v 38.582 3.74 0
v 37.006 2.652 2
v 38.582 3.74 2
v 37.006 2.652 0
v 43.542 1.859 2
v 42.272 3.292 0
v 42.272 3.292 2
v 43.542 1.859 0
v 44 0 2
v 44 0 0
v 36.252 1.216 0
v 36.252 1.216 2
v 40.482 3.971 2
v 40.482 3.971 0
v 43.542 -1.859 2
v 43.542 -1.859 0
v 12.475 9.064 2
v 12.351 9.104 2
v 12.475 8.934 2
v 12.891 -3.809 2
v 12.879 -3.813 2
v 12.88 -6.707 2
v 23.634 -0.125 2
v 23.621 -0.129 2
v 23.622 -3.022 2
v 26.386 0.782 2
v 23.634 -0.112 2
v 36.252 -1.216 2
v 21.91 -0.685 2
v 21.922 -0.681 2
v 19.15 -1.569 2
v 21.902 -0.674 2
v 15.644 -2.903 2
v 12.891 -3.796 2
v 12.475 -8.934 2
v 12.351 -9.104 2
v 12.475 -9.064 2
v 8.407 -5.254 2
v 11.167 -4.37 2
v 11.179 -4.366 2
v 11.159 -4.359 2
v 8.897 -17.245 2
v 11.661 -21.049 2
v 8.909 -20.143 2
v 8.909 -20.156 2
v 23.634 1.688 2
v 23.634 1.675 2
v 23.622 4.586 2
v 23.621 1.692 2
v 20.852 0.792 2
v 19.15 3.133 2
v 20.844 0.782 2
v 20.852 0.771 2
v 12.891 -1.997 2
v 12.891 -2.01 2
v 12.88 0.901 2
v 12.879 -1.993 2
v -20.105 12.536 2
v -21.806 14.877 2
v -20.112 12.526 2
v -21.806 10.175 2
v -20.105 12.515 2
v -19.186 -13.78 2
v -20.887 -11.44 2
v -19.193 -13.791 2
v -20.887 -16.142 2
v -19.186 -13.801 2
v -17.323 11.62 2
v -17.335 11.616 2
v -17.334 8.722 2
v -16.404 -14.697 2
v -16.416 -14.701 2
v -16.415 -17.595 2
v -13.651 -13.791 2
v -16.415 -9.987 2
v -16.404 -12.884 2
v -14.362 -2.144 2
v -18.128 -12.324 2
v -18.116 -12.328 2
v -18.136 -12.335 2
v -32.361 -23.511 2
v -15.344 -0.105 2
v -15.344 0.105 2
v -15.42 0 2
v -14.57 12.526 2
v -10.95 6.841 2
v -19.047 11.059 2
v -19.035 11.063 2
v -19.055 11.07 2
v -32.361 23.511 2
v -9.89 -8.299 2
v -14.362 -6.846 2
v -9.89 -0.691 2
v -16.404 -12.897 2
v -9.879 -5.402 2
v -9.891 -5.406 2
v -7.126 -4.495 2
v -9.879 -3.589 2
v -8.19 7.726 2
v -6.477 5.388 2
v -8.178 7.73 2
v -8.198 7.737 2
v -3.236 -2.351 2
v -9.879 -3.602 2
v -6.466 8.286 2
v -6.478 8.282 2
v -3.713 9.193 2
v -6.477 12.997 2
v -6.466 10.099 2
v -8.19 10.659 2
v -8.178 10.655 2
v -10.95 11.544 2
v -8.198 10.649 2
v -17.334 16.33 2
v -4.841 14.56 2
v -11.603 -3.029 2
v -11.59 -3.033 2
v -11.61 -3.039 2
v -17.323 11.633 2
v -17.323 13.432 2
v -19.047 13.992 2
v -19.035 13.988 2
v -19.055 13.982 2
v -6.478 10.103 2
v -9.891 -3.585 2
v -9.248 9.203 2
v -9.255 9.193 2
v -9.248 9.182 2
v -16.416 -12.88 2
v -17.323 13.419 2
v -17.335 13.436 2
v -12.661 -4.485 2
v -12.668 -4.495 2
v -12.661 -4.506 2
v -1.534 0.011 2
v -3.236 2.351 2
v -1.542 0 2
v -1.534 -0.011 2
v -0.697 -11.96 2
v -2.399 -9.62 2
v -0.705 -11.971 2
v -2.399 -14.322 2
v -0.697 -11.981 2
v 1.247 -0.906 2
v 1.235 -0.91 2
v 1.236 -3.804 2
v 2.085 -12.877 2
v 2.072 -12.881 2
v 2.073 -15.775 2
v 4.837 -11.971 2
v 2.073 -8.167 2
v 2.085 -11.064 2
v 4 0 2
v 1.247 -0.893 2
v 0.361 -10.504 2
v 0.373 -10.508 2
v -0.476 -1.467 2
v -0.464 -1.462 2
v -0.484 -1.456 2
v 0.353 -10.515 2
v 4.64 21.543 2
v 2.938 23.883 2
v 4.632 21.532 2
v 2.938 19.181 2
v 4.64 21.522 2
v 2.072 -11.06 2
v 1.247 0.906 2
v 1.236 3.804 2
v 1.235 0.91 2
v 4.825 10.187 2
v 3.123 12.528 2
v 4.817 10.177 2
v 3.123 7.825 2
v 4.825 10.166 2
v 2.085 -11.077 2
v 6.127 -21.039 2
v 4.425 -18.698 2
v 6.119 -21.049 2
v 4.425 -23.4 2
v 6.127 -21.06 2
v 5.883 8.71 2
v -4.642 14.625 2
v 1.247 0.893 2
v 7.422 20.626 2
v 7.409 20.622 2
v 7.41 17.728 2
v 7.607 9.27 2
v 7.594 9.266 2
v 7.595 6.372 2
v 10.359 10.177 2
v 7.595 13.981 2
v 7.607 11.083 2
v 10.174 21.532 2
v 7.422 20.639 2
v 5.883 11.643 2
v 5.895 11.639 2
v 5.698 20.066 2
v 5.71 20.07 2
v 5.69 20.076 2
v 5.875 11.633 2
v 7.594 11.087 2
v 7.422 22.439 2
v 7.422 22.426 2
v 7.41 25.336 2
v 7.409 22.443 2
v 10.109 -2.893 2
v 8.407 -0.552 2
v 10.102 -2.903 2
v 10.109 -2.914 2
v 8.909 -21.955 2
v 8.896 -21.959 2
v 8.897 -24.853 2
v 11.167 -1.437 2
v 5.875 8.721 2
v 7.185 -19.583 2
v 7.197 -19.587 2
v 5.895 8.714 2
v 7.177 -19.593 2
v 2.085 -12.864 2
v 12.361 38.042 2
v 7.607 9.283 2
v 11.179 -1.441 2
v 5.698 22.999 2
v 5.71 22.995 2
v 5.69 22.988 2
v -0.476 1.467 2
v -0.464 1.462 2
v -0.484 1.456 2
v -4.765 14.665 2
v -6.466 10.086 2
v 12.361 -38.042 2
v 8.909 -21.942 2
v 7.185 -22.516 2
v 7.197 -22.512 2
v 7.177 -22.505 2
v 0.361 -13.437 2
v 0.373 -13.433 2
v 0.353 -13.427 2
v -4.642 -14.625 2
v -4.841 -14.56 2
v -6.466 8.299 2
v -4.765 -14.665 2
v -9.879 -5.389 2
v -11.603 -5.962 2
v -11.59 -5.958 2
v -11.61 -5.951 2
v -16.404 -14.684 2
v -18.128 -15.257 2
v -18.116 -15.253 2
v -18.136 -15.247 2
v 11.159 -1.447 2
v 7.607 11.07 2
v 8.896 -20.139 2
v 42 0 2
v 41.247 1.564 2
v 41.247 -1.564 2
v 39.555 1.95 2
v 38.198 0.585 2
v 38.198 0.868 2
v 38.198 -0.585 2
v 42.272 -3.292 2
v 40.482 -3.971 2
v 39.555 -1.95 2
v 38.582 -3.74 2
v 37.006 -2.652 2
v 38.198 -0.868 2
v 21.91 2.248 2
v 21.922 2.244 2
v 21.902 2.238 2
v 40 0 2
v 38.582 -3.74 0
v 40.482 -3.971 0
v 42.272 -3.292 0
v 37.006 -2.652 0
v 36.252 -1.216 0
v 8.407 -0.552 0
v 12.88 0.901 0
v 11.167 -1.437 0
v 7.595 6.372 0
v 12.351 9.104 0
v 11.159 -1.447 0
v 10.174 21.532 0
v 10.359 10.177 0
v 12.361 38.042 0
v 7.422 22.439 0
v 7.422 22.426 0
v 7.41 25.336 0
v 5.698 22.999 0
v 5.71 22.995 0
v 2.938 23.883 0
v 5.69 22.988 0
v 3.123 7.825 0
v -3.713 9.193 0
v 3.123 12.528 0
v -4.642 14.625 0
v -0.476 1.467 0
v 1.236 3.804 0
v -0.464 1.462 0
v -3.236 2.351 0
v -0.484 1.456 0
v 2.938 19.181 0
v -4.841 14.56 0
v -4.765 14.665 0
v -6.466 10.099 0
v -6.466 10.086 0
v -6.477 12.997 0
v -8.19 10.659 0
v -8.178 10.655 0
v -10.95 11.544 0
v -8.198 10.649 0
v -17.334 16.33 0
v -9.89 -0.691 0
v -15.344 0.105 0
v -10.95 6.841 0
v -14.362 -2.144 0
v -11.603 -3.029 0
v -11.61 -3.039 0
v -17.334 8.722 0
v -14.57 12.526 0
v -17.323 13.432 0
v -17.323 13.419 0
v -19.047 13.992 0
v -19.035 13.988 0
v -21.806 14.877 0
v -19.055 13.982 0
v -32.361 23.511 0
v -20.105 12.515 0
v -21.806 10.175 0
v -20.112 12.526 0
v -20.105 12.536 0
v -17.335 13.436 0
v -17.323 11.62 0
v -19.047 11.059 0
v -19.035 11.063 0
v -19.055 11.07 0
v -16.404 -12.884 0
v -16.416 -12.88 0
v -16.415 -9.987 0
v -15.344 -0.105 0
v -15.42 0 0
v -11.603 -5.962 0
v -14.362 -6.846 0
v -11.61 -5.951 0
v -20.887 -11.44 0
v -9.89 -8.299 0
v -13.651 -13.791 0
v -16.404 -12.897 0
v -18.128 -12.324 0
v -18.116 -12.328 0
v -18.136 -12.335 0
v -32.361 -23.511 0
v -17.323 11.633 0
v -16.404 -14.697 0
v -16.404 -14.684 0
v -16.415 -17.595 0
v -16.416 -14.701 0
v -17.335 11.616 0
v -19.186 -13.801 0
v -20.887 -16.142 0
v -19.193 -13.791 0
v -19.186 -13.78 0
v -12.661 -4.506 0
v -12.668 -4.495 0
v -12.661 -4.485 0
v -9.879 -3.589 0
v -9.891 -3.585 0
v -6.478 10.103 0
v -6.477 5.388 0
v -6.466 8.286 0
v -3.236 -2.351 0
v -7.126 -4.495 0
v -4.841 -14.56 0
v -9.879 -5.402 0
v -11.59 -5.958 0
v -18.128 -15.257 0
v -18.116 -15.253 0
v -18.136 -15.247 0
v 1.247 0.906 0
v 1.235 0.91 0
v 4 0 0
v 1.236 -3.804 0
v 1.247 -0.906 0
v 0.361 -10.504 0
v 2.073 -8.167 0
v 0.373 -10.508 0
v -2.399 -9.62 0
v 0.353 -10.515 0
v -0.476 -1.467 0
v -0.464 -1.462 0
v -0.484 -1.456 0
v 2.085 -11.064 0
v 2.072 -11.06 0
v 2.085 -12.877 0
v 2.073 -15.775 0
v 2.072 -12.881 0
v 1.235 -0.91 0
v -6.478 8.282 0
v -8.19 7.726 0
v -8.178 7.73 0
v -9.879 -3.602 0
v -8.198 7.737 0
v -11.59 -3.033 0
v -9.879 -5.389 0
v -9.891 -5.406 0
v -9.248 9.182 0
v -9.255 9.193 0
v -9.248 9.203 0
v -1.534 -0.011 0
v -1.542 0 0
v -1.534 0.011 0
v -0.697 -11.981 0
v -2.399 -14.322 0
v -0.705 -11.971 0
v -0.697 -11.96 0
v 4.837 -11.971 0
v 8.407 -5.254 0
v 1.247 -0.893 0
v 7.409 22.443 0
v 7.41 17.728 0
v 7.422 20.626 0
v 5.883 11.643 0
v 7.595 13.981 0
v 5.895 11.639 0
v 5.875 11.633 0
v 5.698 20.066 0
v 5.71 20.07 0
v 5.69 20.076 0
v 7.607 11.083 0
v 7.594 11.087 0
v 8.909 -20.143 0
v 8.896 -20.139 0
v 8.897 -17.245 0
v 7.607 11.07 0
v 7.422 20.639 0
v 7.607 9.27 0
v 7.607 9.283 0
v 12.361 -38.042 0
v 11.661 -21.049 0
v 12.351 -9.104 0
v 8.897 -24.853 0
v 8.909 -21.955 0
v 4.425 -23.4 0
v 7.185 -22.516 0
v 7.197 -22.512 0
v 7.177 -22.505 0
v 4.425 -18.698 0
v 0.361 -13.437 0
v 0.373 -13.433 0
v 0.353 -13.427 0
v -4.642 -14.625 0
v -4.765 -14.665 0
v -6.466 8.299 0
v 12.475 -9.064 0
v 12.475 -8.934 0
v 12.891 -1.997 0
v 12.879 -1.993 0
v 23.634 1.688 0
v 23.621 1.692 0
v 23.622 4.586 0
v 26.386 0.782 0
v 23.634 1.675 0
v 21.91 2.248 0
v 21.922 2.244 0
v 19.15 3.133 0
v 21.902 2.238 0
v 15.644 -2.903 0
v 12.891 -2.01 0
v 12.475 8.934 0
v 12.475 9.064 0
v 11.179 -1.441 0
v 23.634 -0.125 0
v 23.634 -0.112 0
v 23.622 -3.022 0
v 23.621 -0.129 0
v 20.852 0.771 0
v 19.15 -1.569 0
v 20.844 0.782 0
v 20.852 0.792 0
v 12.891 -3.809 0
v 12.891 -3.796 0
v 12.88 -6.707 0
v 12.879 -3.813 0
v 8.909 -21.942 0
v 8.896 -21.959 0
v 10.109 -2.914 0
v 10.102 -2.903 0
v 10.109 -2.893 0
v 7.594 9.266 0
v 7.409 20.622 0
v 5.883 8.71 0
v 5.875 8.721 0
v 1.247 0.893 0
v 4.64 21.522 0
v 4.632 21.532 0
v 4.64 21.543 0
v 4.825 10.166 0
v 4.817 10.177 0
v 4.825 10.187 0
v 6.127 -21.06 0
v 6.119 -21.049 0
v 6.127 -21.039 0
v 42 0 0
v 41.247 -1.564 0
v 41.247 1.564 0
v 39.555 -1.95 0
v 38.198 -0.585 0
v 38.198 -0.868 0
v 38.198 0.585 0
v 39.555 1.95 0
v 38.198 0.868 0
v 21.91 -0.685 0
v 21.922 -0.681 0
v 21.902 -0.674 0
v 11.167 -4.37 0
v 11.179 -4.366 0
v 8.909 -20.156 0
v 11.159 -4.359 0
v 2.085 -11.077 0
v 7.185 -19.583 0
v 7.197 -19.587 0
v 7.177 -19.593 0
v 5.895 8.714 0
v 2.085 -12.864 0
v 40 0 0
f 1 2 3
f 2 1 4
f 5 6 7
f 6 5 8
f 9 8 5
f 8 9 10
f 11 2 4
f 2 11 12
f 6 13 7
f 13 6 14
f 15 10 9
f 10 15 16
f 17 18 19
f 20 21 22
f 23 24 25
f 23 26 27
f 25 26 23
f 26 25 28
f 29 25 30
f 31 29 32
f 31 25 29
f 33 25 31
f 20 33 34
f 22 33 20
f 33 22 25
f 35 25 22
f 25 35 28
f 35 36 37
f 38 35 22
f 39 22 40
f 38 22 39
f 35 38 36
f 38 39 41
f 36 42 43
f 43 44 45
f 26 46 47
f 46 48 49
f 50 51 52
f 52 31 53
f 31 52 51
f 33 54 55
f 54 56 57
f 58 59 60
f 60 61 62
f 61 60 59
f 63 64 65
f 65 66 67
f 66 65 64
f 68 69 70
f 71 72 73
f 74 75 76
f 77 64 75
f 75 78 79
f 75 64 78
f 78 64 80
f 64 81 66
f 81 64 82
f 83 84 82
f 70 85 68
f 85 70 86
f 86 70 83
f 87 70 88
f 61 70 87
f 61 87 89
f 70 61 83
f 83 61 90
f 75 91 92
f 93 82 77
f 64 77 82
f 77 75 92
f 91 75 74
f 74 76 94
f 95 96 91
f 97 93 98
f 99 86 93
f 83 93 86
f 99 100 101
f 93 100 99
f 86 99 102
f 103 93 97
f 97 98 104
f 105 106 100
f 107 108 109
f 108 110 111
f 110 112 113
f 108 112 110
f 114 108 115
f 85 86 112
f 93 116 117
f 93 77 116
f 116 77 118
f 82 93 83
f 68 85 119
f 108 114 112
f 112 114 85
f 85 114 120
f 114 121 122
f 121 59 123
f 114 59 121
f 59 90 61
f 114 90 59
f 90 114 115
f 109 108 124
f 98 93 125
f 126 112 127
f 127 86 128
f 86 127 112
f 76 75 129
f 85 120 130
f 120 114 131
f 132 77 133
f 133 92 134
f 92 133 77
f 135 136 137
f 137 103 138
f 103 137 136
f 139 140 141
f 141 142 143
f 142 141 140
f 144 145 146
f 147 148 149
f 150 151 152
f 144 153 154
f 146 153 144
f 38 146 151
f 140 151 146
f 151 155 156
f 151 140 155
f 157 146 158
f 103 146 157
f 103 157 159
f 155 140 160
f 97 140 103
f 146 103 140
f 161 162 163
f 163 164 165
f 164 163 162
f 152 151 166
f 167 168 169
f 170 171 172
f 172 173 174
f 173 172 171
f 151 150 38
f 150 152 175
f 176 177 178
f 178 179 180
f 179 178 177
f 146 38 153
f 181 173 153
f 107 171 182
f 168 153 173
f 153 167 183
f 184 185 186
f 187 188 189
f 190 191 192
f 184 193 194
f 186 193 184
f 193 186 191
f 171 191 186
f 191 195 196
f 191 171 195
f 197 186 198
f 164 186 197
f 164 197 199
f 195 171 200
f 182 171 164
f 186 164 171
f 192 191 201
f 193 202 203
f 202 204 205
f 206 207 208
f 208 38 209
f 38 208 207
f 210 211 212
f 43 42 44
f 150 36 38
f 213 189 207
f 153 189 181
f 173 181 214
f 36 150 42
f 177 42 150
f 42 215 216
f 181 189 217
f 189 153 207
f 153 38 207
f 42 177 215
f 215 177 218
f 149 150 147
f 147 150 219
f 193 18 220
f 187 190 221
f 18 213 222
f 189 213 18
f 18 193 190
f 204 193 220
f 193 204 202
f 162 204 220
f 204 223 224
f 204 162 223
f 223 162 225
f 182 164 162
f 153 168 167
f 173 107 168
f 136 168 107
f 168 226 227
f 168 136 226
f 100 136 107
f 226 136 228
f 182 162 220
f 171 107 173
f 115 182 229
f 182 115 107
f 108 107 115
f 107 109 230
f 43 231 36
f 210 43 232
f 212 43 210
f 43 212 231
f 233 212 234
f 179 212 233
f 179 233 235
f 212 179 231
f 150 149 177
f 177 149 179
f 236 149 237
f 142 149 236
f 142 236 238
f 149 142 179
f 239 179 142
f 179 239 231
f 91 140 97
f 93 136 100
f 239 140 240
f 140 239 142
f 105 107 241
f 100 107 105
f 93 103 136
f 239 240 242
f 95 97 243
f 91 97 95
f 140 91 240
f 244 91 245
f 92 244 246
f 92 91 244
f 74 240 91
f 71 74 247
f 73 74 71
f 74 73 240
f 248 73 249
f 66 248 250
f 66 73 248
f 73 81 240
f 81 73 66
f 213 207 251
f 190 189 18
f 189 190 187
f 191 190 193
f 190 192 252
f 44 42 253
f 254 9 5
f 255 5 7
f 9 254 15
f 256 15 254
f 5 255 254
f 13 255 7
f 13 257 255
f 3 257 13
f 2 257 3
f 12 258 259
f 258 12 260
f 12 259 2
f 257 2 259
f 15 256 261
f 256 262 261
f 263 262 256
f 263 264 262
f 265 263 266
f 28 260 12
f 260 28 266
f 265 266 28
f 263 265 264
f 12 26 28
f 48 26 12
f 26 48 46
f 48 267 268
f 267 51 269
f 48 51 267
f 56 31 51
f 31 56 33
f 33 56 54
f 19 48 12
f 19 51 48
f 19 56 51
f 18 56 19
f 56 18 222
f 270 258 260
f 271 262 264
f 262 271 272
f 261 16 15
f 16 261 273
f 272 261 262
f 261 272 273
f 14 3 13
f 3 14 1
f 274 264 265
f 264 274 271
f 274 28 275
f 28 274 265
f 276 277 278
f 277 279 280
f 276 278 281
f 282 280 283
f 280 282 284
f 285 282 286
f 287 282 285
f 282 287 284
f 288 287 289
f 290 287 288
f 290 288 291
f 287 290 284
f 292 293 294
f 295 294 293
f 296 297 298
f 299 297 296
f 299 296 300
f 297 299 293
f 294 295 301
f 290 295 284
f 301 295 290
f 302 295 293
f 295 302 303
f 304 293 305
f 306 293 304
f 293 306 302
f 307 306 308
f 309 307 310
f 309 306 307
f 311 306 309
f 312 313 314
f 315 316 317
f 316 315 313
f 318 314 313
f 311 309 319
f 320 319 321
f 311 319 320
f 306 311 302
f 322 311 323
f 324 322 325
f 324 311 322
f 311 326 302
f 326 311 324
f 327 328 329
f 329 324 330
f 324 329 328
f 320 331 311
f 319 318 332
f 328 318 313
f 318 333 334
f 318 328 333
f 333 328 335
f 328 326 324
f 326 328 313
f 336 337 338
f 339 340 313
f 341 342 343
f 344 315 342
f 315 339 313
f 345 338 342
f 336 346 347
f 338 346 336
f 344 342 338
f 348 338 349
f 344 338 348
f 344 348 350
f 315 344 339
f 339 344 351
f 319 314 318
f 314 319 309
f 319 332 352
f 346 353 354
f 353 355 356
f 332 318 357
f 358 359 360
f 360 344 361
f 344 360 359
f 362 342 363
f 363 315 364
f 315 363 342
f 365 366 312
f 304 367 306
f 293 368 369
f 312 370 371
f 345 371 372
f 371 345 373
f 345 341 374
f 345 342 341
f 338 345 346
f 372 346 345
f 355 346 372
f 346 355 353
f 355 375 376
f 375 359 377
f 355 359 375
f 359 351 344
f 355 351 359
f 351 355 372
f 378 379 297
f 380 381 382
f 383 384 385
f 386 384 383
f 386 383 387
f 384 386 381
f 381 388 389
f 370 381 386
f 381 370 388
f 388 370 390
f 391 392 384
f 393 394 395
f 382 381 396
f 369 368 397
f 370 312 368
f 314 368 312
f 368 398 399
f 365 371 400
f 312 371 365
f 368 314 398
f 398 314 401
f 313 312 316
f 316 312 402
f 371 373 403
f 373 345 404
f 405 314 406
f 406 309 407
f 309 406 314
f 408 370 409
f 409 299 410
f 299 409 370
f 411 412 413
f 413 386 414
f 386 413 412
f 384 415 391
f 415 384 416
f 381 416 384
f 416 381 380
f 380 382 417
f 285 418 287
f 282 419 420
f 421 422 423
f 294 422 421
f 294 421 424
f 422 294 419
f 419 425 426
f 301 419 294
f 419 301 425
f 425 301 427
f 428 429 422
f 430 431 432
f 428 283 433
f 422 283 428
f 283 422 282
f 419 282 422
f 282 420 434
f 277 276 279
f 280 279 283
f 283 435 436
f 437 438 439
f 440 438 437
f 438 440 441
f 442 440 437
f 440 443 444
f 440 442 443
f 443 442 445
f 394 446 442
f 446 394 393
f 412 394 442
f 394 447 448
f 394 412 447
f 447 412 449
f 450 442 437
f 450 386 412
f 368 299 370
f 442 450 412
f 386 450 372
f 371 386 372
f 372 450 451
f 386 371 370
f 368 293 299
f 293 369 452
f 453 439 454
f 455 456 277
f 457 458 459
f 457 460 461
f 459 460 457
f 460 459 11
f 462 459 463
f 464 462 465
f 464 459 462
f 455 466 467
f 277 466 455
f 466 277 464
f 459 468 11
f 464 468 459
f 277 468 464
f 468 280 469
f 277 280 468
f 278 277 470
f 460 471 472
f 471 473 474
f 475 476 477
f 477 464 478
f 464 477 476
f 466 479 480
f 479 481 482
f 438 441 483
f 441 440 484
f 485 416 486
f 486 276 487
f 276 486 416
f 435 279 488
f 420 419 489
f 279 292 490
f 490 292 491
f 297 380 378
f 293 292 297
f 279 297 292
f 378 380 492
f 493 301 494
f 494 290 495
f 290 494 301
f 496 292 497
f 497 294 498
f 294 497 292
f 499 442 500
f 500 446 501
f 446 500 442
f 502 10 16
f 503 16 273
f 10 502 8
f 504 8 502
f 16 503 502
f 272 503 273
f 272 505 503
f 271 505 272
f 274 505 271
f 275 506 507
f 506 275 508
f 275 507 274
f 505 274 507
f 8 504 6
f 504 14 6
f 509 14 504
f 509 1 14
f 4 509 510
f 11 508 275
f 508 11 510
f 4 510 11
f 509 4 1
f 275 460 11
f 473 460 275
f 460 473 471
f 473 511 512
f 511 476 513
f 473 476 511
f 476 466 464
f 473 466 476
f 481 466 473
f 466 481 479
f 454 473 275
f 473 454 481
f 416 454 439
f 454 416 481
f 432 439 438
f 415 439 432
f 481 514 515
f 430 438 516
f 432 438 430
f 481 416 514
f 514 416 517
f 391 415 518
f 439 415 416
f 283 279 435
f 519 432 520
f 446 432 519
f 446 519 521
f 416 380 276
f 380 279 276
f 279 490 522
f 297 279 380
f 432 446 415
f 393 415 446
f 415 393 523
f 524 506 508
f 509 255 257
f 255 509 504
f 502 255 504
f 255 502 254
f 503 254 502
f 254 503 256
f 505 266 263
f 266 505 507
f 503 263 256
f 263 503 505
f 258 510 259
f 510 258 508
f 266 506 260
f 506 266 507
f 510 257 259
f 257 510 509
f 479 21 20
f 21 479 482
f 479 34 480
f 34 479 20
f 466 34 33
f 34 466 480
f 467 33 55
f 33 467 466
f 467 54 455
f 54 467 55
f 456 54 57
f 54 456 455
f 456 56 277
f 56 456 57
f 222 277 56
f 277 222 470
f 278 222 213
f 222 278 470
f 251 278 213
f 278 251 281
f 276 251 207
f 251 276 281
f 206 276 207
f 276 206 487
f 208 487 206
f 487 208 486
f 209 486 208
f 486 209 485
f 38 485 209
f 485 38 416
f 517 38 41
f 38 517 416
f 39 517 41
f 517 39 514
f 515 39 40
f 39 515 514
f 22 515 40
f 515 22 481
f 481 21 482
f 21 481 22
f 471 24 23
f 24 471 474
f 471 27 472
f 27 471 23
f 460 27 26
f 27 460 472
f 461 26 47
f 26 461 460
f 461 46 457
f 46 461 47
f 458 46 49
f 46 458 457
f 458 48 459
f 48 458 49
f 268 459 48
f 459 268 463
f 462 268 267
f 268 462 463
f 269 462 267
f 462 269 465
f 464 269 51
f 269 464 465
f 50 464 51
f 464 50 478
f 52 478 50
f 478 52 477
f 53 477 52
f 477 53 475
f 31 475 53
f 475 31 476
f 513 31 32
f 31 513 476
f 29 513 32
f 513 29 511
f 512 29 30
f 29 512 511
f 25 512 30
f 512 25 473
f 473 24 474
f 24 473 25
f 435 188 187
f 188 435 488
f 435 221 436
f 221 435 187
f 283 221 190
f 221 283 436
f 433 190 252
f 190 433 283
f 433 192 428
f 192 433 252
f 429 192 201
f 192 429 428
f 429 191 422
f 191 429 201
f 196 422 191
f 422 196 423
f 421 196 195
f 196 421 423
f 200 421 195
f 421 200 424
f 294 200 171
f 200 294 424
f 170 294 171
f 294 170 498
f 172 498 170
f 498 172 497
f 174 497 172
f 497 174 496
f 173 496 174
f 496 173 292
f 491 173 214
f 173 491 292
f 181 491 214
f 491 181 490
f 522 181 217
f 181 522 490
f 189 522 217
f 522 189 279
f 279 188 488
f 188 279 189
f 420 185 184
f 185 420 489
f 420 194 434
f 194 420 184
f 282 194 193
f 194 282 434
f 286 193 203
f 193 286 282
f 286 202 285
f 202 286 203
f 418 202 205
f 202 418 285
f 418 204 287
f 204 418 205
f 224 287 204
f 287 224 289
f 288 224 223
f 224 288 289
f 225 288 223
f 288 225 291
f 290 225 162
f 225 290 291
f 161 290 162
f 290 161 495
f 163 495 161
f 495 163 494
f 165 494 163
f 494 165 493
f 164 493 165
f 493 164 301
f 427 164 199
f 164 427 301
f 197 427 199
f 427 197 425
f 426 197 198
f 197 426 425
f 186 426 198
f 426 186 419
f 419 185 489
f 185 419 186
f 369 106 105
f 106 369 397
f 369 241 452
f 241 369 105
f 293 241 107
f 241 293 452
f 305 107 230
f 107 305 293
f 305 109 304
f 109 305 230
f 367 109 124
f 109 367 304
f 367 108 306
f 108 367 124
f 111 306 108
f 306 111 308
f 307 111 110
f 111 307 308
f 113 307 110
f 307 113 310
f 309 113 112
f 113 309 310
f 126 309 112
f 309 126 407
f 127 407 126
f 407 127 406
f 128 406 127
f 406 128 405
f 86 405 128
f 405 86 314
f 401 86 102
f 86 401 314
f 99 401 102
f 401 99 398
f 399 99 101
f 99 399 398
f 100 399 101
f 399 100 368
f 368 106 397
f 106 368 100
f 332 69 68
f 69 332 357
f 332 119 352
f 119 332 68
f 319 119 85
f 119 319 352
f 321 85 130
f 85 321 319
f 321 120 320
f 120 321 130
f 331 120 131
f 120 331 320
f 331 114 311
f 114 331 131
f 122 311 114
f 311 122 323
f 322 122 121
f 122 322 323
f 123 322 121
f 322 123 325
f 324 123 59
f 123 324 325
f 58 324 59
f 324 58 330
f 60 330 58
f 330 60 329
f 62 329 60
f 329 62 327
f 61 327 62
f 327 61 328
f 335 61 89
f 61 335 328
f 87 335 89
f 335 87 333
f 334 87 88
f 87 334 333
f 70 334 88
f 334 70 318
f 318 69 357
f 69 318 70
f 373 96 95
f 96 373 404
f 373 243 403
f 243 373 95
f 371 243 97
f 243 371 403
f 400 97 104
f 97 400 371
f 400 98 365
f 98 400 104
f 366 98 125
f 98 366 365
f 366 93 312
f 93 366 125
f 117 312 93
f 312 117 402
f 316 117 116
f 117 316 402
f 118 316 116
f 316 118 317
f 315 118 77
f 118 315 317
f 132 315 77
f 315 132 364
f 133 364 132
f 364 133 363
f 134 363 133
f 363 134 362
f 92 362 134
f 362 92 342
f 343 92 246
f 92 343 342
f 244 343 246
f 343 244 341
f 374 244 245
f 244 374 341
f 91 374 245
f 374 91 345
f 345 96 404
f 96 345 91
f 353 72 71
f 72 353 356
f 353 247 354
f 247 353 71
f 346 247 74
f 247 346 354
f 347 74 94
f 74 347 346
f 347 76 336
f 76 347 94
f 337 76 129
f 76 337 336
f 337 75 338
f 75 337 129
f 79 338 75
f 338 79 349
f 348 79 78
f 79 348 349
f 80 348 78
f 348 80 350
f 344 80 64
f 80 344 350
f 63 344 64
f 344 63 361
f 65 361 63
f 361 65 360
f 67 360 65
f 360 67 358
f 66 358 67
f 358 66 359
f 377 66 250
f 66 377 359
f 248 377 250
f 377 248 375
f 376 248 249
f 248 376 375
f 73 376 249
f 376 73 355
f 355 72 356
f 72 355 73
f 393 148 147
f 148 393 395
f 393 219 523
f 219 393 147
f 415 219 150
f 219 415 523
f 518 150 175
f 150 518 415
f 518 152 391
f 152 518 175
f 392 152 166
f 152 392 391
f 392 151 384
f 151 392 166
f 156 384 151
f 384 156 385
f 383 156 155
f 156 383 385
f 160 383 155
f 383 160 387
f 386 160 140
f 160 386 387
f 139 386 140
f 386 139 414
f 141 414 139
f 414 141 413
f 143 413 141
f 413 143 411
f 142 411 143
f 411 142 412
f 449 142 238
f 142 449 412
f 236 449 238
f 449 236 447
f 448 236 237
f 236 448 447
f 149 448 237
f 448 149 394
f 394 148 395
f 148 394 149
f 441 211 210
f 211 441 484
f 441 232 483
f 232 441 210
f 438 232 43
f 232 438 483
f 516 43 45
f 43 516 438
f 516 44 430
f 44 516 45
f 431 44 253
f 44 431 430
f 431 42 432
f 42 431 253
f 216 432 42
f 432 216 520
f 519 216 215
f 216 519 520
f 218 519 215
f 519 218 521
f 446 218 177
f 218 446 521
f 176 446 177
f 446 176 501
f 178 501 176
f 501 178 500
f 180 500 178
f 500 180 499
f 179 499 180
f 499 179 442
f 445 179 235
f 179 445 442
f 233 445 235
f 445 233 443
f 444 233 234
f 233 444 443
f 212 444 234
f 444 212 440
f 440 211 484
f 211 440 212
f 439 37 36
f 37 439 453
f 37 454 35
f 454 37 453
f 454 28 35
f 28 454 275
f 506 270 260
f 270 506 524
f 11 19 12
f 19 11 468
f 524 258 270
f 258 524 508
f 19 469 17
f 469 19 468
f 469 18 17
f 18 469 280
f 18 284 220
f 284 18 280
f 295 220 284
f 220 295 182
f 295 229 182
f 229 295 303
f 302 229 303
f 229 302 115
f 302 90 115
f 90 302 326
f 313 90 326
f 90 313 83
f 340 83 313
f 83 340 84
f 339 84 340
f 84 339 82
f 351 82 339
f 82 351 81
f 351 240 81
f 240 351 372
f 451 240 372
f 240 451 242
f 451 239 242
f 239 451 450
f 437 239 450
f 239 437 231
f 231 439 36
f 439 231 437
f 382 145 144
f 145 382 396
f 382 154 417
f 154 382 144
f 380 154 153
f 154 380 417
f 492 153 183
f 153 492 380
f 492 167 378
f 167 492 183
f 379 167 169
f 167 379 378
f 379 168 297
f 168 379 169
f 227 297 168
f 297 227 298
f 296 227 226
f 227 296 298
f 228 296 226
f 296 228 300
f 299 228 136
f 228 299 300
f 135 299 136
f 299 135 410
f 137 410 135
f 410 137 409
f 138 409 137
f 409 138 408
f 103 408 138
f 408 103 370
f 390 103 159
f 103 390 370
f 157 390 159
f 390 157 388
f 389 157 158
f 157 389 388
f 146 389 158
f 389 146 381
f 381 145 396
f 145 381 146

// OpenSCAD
// [FL_INDEX: keywords="openscad, 3d_parametric, Fancy_5_point_star, csg_solid" | COT="Parametric OpenSCAD design from 3DCodeverse"]
// Title: Fancy 5 point star

// radius of the large star
radius=40;
// radius of the small stars
little=4;
//thickness
thick=2;
//-- Based on Parametric star(c)  2010 Juan Gonzalez-Gomez (Obijuan) juan@iearobotics.com
//-- GPL license

//-- The 2*N points of an N-ponted star are calculated as follows:
//-- There are two circunferences:  the inner and outer.  Outer points are located
//-- at angles: 0, 360/N, 360*2/N and on the outer circunference
//-- The inner points have the same angular distance but they are 360/(2*N) rotated
//-- respect to the outers. They are located on the inner circunference

//--- INPUT PARAMETERS:
//--- N: Number of points
//--  h: Height
//-- ri: Inner radius
//-- ro: outer radius
module parametric_star(N=5, h=2, ri=15, re=30) {

  //-- Calculate and draw a 2D tip of the star
 //-- INPUT: 
 //-- n: Number of the tip (from 0 to N-1)
  module tipstar(n) {
     i1 =  [ri*cos(-360*n/N+360/(N*2)), ri*sin(-360*n/N+360/(N*2))];
    e1 = [re*cos(-360*n/N), re*sin(-360*n/N)];
    i2 = [ri*cos(-360*(n+1)/N+360/(N*2)), ri*sin(-360*(n+1)/N+360/(N*2))];
    polygon([ i1, e1, i2]);
  }

  //-- Draw the 2D star and extrude
  
   //-- The star is the union of N 2D tips. 
   //-- A inner cylinder is also needed for filling
   //-- A flat (2D) star is built. The it is extruded
    linear_extrude(height=h) 
    union() {
      for (i=[0:N-1]) {
         tipstar(i);
      }
      rotate([0,0,360/(2*N)]) circle(r=ri+ri*0.01,$fn=N);
    }
}

radius=40;
little=4;
union(){
difference(){
translate([radius,0,0]) cylinder(thick,4,4);
translate([radius,0,0]) cylinder(thick,2,2);
}
difference(){
	parametric_star(N=5,h=thick, ri=radius/2.62,re=radius);
	parametric_star(N=5,h=thick, ri=little/2.62,re=little);
		for (j=[0:4]){
	//	x1= outer*cos(j*72-14)
	//	y1=outer*sin(j*72-14)
	translate([0.3*radius*cos(j*72-14),0.3*radius*sin(j*72-14),0]) parametric_star(N=5,h=thick, ri=little/2.62,re=little);
	translate([0.56*radius*cos(j*72+2),0.56*radius*sin(j*72+2),0]) parametric_star(N=5,h=thick, ri=little/2.62,re=little);
	}
}
}
